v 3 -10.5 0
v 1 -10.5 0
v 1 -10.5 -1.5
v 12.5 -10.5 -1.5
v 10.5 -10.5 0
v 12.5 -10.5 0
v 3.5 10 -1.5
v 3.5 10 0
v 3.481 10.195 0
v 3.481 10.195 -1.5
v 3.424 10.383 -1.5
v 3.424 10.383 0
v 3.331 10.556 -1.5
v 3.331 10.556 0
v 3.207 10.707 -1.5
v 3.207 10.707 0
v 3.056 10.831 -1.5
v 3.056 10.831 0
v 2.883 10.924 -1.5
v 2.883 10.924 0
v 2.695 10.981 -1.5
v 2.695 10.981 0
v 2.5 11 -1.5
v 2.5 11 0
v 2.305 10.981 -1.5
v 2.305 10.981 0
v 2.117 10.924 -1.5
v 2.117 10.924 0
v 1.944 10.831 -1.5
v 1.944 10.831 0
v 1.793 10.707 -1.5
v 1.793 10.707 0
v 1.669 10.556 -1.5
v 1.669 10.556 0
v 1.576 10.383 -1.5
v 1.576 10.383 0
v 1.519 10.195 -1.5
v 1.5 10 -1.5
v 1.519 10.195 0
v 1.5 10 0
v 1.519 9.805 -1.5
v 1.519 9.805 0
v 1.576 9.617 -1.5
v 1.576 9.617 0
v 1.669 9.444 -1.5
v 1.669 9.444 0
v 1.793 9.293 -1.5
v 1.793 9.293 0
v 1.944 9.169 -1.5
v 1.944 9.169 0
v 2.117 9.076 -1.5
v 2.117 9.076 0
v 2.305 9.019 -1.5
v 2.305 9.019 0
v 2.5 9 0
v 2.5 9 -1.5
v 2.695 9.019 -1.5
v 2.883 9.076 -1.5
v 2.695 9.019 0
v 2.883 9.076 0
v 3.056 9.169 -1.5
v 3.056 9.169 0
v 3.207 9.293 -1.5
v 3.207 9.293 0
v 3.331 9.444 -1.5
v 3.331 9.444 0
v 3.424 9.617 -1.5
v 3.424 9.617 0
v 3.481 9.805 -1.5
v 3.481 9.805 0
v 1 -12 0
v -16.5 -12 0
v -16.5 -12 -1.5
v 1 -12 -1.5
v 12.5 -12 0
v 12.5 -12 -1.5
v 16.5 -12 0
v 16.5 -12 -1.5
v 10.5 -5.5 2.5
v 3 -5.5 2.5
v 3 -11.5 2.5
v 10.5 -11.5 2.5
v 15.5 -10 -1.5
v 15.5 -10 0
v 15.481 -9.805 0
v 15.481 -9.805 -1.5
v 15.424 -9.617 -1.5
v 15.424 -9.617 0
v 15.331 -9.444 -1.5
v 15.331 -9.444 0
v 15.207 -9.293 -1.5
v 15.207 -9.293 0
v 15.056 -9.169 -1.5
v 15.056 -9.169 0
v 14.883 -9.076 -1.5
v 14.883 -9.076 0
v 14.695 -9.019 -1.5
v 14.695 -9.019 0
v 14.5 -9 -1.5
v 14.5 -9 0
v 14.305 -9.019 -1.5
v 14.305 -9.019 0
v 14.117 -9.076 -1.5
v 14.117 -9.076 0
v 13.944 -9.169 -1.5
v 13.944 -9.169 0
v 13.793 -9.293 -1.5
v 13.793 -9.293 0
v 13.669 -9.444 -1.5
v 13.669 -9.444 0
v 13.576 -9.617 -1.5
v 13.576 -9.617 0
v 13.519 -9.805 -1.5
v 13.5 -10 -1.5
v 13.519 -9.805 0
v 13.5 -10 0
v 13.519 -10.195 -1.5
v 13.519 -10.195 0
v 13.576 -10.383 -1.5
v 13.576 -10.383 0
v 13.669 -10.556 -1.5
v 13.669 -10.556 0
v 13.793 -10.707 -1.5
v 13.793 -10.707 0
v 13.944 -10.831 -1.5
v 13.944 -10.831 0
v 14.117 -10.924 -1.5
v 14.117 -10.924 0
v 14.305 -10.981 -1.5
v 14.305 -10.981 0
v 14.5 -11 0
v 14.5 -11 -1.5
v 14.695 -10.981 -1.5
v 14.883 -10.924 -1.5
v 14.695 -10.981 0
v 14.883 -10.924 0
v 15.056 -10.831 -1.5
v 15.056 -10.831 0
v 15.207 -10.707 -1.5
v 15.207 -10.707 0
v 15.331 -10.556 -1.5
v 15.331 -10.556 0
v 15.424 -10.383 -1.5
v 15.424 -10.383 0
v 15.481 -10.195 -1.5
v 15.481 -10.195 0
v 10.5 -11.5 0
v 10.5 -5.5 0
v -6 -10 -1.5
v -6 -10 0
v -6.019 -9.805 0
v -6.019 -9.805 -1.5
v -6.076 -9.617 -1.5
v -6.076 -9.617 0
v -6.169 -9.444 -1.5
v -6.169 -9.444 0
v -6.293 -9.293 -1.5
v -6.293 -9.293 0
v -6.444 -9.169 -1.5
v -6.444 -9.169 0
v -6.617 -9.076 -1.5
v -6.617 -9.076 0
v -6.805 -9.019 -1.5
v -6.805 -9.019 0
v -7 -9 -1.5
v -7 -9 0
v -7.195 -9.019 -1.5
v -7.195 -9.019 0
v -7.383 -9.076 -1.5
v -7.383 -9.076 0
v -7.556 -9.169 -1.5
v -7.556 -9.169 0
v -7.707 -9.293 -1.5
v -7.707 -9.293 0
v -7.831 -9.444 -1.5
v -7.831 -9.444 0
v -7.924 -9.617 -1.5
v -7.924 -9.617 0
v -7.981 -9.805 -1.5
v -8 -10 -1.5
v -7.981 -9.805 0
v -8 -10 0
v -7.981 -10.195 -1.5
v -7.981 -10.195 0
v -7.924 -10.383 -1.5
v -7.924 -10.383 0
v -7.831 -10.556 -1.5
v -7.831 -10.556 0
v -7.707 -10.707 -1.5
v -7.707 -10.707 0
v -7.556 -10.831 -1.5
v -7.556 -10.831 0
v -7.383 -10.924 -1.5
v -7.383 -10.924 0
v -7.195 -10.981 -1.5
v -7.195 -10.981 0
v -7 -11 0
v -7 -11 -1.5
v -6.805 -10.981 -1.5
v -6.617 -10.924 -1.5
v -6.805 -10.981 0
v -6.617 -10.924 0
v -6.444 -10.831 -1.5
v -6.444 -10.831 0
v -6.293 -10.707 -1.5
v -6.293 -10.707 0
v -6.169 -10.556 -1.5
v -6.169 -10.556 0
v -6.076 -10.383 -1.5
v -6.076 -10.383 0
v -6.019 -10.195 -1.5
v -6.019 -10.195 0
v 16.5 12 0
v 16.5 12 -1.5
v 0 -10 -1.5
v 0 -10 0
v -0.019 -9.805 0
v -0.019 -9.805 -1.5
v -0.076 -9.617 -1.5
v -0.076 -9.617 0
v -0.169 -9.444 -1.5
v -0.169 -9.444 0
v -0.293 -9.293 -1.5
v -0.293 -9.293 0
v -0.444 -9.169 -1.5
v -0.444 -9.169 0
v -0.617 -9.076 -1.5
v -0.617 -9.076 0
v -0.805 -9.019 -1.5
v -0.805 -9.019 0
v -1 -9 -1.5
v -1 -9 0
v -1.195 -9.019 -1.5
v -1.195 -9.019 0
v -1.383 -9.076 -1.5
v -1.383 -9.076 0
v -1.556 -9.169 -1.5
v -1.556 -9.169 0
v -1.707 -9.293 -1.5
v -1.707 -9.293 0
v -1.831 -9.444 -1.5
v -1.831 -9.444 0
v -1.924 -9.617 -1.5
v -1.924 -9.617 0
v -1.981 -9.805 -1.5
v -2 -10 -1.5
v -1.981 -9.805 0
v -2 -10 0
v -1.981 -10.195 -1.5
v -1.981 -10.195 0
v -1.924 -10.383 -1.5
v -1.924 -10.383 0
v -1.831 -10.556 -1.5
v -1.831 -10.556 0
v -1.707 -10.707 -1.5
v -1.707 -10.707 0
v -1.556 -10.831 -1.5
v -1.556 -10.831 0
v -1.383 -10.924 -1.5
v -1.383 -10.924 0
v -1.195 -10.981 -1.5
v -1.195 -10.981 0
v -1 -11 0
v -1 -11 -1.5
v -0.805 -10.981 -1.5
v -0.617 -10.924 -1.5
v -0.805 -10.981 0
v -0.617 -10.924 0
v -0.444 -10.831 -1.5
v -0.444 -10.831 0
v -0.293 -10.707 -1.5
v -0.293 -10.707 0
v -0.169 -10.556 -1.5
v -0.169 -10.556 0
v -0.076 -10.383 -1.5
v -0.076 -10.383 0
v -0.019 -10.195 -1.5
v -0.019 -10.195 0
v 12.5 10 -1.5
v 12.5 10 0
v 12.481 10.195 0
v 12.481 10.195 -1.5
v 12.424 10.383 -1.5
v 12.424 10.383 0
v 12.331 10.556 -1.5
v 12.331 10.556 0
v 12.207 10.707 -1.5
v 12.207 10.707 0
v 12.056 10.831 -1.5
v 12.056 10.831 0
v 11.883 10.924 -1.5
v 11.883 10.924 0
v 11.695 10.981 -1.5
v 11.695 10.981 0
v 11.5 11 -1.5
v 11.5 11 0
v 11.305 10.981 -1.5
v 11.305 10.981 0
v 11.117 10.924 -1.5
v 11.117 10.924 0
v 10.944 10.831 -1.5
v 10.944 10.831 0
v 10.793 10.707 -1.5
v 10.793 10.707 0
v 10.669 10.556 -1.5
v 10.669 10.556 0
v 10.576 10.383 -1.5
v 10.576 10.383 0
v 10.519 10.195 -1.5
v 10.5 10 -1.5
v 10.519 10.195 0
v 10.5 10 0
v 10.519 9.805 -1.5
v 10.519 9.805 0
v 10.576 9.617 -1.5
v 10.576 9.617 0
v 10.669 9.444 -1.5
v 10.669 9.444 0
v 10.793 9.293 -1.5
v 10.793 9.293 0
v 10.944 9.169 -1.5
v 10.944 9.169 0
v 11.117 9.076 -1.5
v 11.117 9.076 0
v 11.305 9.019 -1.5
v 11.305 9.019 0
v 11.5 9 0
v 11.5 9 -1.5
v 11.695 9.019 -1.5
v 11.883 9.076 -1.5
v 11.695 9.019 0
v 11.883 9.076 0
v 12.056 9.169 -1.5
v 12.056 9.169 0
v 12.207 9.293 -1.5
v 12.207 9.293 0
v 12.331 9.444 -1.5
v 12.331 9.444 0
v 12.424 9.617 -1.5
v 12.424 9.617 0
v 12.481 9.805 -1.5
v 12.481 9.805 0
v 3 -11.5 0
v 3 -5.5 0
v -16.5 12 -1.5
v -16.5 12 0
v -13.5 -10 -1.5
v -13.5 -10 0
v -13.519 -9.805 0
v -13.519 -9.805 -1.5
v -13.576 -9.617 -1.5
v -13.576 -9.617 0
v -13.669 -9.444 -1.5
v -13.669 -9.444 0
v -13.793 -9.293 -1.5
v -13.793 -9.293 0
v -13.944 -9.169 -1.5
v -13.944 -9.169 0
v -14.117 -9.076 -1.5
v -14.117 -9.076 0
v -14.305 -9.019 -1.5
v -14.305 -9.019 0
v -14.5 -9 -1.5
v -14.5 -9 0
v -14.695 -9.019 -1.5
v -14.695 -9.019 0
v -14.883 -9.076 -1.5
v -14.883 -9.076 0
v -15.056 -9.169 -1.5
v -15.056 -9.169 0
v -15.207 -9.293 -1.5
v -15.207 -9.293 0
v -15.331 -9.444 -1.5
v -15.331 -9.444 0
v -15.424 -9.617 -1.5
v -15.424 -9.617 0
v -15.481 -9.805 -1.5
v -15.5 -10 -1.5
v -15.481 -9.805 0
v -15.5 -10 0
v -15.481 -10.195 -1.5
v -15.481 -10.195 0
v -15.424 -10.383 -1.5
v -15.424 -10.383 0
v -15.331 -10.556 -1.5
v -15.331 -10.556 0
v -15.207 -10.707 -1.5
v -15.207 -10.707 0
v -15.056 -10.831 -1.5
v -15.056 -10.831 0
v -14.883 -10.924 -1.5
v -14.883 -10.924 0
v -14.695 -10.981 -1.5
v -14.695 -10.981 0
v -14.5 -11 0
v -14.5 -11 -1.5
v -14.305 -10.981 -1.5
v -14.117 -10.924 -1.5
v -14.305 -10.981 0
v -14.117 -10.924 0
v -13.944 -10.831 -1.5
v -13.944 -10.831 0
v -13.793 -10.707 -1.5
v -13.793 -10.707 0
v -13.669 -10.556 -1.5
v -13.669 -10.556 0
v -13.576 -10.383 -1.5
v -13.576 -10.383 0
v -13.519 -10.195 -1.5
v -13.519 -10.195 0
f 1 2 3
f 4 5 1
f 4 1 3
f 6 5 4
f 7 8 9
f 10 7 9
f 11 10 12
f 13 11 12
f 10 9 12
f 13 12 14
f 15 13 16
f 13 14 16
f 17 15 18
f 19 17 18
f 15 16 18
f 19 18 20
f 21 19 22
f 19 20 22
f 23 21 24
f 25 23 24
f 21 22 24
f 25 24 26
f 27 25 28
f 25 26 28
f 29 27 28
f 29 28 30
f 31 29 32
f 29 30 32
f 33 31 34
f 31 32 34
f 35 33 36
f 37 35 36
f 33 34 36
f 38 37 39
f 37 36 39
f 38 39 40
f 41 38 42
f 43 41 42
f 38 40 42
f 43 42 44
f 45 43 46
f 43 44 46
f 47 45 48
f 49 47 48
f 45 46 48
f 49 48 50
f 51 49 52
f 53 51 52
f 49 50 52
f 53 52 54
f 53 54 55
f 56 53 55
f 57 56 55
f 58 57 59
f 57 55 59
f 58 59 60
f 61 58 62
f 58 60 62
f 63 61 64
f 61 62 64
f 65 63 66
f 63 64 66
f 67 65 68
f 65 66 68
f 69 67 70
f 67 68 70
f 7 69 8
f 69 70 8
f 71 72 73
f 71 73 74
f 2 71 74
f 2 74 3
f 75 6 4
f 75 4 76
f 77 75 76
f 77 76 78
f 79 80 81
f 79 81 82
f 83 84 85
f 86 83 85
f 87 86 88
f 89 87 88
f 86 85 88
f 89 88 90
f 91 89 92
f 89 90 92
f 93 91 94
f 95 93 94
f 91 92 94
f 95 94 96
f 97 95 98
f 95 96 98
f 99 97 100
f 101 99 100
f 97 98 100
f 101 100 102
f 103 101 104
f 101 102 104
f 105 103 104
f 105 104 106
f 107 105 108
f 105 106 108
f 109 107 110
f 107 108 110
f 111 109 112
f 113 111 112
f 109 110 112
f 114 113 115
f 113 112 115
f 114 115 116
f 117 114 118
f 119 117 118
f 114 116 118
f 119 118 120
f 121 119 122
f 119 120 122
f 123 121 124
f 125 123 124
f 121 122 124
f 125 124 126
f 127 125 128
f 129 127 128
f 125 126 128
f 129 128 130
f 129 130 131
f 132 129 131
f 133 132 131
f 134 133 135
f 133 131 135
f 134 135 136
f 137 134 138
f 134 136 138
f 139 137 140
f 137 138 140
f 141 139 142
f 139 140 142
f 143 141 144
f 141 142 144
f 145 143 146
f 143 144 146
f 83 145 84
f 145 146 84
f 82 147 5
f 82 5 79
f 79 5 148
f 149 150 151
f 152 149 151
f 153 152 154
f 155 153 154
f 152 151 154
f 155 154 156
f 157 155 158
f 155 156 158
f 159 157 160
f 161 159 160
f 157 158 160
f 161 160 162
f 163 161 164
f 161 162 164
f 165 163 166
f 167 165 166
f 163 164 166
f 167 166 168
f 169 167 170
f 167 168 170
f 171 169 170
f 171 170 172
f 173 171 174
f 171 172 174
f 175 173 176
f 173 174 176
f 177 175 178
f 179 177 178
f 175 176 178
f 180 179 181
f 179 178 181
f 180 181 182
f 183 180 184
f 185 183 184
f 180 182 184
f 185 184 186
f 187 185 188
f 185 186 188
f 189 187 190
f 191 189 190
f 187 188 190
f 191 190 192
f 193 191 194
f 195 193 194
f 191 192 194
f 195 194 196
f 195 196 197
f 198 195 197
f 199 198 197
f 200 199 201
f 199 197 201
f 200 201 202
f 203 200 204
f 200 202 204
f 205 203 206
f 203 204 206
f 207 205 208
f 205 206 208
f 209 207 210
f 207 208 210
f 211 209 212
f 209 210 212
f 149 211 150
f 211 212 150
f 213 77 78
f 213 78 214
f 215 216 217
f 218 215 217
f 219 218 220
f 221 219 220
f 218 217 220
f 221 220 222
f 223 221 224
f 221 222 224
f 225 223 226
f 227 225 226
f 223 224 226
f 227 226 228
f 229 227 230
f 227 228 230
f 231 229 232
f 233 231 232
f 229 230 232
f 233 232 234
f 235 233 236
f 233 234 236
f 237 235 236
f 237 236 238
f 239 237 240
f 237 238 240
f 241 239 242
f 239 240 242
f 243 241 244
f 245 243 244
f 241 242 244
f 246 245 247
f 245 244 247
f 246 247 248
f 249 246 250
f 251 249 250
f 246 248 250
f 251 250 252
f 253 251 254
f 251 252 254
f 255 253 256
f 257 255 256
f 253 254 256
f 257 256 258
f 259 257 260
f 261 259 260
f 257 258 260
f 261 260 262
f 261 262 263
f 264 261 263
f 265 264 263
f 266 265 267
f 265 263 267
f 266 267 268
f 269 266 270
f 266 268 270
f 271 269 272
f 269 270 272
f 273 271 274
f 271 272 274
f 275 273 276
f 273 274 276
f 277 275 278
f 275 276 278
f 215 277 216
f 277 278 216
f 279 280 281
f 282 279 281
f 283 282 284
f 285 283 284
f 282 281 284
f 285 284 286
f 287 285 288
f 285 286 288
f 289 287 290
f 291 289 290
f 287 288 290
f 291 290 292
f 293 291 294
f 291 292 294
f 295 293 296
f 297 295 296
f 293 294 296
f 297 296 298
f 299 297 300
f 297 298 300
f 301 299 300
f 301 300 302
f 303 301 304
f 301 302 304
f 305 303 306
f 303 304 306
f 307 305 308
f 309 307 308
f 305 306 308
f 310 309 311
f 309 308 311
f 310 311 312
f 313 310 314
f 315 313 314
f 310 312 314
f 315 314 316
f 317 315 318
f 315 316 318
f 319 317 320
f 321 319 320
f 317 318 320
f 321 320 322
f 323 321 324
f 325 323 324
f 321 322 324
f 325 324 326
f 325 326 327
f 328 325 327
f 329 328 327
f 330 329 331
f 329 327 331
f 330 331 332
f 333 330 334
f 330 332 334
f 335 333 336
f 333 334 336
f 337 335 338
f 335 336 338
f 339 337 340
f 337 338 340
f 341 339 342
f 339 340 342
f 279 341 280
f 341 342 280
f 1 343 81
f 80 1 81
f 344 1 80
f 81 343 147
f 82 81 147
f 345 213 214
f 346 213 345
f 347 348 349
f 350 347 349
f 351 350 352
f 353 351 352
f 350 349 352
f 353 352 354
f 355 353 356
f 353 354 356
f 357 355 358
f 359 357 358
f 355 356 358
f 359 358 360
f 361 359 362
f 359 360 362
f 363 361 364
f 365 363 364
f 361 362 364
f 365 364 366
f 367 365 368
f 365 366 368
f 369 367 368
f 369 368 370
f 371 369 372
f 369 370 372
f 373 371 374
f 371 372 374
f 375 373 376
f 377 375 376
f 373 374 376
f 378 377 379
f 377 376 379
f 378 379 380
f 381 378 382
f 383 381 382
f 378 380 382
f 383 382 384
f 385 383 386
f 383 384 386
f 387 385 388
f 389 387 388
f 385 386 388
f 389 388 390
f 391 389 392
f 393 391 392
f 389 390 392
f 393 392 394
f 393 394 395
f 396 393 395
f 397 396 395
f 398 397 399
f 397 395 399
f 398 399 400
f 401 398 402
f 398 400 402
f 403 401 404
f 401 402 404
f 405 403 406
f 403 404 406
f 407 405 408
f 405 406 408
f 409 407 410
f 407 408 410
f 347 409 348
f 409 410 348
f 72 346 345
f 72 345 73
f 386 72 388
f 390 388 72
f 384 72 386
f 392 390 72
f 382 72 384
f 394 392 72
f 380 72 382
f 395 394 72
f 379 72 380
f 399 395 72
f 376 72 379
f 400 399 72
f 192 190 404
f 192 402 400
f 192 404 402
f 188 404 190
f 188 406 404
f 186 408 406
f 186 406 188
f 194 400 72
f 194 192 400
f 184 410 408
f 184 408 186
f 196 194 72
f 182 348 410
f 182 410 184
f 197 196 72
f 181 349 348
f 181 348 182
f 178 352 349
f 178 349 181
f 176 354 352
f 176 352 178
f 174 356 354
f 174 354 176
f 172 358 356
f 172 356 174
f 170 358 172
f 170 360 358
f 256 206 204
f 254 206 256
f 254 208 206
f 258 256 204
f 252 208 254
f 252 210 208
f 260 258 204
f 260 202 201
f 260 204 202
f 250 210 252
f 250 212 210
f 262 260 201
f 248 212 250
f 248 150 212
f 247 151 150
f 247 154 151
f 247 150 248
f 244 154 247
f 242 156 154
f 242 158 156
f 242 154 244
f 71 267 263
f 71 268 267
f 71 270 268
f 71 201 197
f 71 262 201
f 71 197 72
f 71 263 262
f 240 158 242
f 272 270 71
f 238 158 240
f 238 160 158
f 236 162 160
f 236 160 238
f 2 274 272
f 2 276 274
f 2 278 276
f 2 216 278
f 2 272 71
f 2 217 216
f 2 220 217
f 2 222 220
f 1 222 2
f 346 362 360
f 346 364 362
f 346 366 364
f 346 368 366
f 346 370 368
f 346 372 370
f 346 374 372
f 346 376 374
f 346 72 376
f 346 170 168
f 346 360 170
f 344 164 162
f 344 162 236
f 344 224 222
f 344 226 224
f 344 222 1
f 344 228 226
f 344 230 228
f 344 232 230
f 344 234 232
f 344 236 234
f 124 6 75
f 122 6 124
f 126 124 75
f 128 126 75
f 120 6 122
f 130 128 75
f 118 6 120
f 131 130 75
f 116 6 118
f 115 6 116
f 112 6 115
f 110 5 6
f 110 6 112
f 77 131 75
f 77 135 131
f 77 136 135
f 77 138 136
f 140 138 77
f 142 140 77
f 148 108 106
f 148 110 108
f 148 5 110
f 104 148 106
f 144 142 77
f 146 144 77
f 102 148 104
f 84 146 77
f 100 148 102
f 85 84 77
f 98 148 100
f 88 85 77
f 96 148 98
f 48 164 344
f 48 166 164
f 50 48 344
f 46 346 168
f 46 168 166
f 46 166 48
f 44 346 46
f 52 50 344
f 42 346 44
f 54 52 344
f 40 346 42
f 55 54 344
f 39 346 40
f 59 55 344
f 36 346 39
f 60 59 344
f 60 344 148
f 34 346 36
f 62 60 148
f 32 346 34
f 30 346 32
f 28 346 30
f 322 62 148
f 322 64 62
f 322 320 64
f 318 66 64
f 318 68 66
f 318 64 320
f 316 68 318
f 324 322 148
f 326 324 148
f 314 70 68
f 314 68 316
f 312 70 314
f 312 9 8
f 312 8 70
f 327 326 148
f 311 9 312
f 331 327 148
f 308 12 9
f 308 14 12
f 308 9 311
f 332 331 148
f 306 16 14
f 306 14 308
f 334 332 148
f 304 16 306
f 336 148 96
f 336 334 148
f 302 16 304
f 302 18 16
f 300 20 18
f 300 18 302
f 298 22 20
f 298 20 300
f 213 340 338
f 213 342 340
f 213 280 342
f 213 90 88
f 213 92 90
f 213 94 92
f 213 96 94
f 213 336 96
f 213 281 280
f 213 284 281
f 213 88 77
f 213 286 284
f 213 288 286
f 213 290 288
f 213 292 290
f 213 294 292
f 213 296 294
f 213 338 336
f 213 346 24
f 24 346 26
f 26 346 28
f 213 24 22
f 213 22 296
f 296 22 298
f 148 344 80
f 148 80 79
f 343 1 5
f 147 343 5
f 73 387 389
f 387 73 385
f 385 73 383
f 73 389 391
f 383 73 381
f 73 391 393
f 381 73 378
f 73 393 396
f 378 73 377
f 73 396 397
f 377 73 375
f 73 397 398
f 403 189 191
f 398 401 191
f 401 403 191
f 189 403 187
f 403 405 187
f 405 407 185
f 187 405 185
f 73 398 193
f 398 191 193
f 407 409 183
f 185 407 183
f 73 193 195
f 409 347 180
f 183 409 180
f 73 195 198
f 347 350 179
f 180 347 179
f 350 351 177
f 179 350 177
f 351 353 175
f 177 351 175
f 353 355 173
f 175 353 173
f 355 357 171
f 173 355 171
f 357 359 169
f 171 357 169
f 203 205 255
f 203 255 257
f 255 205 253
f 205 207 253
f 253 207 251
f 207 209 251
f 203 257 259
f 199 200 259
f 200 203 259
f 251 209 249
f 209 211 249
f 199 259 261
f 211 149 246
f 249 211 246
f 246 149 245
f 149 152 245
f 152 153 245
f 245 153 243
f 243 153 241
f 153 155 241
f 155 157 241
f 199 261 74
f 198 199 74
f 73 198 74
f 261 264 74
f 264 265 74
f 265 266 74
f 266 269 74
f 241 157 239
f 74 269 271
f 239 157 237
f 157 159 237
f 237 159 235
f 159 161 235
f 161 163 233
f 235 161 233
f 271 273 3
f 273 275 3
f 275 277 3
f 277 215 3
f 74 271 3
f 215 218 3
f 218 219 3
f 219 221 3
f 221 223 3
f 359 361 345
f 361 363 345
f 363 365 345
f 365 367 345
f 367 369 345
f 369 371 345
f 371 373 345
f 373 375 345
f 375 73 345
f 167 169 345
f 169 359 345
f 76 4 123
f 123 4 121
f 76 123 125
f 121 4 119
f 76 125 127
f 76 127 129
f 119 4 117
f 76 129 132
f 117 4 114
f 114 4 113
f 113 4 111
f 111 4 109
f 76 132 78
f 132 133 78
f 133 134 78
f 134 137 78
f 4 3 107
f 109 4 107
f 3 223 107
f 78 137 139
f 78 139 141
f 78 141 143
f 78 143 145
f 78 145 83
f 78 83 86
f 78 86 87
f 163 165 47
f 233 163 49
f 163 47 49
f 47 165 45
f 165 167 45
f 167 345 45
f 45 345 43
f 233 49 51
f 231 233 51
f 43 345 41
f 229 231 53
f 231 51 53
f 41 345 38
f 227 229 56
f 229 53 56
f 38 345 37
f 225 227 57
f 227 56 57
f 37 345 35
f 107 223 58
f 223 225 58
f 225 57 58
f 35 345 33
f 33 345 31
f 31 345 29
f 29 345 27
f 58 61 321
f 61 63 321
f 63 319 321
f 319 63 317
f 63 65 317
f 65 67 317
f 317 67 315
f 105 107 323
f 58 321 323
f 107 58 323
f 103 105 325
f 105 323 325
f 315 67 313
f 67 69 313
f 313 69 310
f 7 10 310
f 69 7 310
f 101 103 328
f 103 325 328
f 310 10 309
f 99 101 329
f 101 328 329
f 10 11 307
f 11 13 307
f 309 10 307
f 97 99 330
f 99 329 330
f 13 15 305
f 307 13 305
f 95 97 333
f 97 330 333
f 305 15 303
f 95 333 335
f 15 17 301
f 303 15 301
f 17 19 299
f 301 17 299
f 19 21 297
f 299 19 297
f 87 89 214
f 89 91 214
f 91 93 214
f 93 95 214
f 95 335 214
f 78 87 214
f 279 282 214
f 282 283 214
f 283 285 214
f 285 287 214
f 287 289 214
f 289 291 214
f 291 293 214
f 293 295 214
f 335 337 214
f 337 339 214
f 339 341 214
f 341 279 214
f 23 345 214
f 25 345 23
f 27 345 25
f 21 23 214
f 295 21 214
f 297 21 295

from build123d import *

# Parameters (mm, degrees)
SKETCH_1_R      = 1
EXTRUDE_1_DEPTH = 1.5
SKETCH_2_W      = 7.5
SKETCH_2_H      = 6
EXTRUDE_2_DEPTH = 2.5


with BuildPart() as part:
    # Эскиз1 → Бобышка-Вытянуть1 (new body)
    with BuildSketch(Plane.XY):
        Polygon((16.5, 12), (-16.5, 12), (-16.5, -12), (1, -12), (1, -10.5), (12.5, -10.5), (12.5, -12), (16.5, -12), align=None)
        with Locations((-14.5, -10)):
            Circle(SKETCH_1_R, mode=Mode.SUBTRACT)
        with Locations((-7, -10)):
            Circle(SKETCH_1_R, mode=Mode.SUBTRACT)
        with Locations((-1, -10)):
            Circle(SKETCH_1_R, mode=Mode.SUBTRACT)
        with Locations((14.5, -10)):
            Circle(SKETCH_1_R, mode=Mode.SUBTRACT)
        with Locations((2.5, 10)):
            Circle(SKETCH_1_R, mode=Mode.SUBTRACT)
        with Locations((11.5, 10)):
            Circle(SKETCH_1_R, mode=Mode.SUBTRACT)
    extrude(amount=-EXTRUDE_1_DEPTH)

    # Эскиз2 → Бобышка-Вытянуть2 (add)
    with BuildSketch(Plane.XY):
        with Locations((6.75, -8.5)):
            Rectangle(SKETCH_2_W, SKETCH_2_H)
    extrude(amount=EXTRUDE_2_DEPTH)


solid = part.part
